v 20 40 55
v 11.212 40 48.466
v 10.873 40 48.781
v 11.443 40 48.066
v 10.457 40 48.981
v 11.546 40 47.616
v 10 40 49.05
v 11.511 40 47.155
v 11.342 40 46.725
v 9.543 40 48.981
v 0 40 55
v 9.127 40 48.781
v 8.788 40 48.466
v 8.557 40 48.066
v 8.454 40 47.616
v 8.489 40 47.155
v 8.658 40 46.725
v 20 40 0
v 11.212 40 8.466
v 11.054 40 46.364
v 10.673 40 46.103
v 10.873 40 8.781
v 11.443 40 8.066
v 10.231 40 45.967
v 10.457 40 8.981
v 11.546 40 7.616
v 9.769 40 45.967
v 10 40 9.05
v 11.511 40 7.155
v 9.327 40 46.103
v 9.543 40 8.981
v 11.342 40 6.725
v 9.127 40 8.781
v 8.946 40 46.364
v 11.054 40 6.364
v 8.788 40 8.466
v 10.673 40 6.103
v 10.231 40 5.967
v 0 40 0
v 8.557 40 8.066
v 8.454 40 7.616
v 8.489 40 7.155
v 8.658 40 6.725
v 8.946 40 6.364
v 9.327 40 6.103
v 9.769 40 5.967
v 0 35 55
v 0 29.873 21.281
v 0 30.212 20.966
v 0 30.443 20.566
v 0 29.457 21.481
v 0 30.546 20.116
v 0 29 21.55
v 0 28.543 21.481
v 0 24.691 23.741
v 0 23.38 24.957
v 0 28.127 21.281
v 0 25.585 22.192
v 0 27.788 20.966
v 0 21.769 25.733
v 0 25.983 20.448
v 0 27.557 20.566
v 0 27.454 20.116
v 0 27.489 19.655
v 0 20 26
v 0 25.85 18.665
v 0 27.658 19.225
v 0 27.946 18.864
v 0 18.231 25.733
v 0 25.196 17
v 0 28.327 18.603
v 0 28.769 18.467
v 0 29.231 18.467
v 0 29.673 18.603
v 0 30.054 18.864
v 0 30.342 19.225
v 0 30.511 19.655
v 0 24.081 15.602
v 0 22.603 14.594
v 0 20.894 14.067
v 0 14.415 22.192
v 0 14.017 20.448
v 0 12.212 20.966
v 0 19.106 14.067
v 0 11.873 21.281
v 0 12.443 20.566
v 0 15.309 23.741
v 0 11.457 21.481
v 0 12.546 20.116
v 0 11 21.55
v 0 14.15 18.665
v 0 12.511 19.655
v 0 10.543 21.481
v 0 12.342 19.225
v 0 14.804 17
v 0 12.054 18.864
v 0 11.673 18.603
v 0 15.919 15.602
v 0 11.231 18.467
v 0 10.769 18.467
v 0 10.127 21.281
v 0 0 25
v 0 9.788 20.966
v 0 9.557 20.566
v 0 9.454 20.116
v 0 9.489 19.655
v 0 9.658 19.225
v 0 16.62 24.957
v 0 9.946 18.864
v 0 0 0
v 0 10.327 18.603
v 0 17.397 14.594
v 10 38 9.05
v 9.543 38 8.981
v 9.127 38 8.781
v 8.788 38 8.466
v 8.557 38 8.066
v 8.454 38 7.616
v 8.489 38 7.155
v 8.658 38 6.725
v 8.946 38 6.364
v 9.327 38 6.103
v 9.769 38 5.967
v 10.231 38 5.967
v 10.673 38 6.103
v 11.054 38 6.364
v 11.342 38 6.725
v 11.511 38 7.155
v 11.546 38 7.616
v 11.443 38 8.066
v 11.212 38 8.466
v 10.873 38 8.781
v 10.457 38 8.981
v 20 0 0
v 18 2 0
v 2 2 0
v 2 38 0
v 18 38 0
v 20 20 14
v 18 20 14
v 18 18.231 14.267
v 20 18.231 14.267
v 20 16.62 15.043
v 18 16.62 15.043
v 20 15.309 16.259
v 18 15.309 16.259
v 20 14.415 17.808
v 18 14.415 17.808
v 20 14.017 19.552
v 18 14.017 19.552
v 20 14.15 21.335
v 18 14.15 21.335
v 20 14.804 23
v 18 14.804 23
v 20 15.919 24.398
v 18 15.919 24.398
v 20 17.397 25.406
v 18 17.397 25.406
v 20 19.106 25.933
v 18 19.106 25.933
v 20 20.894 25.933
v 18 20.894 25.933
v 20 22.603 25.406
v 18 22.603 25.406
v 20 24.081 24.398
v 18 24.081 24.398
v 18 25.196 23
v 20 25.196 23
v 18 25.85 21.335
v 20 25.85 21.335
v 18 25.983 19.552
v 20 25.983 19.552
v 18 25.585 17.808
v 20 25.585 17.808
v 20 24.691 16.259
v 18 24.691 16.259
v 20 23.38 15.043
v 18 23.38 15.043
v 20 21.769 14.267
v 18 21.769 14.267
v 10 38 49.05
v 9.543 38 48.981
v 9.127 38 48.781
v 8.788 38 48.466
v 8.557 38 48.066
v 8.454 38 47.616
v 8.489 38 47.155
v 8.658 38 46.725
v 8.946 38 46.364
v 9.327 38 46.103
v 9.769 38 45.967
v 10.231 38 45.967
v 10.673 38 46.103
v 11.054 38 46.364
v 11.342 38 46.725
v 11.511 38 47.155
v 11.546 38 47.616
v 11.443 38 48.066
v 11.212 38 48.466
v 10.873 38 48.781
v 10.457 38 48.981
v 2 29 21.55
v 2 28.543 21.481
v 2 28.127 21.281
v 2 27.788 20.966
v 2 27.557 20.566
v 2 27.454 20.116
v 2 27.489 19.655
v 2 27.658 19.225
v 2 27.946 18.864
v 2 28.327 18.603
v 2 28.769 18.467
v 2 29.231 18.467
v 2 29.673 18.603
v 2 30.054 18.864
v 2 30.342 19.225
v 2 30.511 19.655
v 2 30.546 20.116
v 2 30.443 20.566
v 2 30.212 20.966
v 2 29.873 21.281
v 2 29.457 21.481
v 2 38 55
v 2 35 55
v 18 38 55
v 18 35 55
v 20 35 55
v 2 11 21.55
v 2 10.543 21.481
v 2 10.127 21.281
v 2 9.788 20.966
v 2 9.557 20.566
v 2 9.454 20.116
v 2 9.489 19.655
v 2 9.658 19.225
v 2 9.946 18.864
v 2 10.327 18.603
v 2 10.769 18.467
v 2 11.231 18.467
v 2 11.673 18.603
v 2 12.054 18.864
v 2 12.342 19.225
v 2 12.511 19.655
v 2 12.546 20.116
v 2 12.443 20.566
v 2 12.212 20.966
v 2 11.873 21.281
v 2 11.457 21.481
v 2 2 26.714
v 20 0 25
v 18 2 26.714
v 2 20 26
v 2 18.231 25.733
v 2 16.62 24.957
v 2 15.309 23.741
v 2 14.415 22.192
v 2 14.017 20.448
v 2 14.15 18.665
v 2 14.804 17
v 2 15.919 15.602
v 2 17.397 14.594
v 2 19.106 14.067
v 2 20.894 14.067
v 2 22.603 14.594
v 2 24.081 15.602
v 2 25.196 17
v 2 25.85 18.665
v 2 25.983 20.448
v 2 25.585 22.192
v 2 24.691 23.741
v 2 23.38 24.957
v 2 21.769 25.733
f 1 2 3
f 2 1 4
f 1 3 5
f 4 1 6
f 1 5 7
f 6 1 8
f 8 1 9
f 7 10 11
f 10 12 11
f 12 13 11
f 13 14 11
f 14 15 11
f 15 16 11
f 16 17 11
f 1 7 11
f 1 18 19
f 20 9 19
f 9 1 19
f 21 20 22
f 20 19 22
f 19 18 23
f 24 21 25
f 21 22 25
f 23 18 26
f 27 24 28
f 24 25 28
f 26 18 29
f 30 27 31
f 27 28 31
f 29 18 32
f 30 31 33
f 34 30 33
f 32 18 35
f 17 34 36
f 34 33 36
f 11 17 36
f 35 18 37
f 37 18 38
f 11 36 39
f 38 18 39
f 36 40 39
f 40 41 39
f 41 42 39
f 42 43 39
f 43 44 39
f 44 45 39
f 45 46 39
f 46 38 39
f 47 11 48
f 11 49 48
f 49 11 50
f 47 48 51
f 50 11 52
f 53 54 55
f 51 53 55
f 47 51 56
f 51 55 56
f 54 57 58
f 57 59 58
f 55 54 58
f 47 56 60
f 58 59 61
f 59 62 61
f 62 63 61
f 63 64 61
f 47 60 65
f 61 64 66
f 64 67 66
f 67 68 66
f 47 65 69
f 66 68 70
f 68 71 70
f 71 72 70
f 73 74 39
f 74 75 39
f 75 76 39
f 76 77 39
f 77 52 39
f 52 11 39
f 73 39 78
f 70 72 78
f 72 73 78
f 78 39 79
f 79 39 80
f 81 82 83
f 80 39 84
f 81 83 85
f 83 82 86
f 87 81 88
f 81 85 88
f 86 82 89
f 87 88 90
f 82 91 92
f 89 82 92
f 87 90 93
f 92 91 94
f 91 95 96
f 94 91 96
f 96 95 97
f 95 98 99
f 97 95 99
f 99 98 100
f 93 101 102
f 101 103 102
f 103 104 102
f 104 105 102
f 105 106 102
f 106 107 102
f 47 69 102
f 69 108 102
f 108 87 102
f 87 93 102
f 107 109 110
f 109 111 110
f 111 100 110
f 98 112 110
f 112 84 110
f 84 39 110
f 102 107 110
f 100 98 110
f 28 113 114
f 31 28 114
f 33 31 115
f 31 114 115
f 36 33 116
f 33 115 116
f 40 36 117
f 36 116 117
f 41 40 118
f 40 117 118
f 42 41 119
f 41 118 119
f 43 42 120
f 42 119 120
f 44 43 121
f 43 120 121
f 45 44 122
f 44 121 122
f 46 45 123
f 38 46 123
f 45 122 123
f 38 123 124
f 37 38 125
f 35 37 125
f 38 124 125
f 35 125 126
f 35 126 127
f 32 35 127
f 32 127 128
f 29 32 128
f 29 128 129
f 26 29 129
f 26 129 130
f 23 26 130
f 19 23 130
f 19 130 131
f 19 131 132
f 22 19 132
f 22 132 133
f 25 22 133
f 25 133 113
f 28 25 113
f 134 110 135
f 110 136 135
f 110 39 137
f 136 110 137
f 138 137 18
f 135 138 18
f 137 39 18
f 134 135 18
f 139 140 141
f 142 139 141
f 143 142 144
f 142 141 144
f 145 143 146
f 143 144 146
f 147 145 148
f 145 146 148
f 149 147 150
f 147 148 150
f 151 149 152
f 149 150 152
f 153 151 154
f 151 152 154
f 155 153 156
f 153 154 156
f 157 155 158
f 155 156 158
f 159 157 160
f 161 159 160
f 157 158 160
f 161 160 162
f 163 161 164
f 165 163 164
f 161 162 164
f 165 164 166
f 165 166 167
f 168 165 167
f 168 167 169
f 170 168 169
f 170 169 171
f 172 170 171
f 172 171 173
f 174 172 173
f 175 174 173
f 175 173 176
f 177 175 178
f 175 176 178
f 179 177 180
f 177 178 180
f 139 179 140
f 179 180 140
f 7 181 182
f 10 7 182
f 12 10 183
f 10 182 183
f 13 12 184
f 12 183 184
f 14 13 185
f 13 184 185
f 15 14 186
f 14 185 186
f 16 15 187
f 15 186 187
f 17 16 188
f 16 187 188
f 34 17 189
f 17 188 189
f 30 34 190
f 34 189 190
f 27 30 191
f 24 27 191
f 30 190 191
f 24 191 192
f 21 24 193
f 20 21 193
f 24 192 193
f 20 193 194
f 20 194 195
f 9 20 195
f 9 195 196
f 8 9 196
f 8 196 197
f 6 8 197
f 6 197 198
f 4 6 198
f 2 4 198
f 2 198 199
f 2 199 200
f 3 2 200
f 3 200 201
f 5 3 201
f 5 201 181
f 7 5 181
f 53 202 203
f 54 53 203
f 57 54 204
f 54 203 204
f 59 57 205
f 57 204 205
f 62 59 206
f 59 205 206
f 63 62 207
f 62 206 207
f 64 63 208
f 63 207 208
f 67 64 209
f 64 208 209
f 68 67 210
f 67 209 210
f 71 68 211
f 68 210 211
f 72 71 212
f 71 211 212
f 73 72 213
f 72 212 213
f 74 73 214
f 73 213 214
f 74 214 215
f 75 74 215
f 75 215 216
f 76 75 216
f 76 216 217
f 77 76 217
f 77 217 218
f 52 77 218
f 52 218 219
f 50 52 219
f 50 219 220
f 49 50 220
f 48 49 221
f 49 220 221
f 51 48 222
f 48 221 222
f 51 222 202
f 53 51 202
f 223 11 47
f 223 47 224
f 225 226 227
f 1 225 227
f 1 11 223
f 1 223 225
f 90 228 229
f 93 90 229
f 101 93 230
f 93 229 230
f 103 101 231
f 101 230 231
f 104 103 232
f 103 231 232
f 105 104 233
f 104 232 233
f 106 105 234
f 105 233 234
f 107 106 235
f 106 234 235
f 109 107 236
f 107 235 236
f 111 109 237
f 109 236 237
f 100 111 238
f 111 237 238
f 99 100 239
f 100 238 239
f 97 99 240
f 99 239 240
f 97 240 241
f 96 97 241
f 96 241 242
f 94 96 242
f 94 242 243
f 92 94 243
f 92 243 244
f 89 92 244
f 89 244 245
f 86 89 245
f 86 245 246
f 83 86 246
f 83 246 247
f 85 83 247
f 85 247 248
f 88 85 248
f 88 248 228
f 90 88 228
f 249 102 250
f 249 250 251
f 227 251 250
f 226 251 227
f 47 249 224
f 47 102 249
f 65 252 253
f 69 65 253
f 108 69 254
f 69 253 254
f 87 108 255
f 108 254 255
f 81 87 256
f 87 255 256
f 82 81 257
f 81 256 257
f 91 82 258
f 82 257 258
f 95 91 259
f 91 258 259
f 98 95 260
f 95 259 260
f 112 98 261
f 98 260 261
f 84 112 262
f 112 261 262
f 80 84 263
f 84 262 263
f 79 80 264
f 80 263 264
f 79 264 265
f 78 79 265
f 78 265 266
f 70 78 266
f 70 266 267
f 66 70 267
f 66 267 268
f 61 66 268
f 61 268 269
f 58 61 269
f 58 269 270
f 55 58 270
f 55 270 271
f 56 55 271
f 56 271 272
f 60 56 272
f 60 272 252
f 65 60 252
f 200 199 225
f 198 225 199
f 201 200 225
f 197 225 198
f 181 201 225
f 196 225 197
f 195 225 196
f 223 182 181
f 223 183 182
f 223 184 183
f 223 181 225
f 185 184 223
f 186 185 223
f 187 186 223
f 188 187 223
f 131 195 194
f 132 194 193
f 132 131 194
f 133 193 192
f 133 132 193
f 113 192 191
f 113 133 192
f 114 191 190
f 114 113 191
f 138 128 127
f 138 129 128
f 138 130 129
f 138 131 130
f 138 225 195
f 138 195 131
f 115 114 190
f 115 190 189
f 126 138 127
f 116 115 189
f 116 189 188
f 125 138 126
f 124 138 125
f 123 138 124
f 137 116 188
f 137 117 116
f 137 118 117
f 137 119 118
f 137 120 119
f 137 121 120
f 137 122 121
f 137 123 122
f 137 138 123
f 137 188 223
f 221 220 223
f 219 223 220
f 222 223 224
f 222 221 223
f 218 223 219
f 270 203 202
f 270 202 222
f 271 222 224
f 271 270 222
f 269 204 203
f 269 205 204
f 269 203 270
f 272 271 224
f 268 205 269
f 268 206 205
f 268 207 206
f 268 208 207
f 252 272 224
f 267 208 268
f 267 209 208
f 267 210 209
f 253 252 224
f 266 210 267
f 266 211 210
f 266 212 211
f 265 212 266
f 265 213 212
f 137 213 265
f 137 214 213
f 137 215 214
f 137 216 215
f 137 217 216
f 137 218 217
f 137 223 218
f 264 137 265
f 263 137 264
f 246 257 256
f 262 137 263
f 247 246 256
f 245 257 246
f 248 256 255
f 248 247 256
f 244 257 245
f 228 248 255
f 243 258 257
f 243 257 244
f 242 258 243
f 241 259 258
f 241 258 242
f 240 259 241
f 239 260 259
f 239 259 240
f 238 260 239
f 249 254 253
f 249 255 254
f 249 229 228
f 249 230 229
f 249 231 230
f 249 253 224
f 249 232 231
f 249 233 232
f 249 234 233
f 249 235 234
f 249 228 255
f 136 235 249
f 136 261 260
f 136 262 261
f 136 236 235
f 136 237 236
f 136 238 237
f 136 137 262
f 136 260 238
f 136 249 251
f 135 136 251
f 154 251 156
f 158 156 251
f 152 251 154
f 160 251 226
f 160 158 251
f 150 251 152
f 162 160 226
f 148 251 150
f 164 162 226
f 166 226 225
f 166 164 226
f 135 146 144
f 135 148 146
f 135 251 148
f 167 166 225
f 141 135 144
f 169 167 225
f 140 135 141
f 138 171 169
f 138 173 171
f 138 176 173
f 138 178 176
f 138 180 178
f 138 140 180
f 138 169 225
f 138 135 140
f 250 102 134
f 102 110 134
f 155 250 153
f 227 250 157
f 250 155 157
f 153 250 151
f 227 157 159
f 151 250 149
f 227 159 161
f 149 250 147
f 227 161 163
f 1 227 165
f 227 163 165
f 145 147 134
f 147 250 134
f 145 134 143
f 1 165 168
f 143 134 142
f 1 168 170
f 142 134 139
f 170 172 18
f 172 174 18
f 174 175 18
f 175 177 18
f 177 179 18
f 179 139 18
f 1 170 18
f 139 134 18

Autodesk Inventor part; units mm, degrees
ref_plane "YZ Plane" through (0, 0, 0) normal (1, 0, 0) x (0, 1, 0)
ref_plane "XZ Plane" through (0, 0, 0) normal (0, 1, 0) x (-1, 0, 0)
ref_plane "XY Plane" through (0, 0, 0) normal (0, 0, 1) x (1, 0, 0)
sketch "スケッチ1" plane through (0, 0, 0) normal (0, 0, 1) x (1, 0, 0)
  line L0 (0, 0) -> (20, 0)
  line L1 (20, 0) -> (20, 40)
  line L2 (20, 40) -> (0, 40)
  line L3 (0, 40) -> (0, 0)
  line L4 (2, 2) -> (18, 2)
  line L5 (18, 2) -> (18, 38)
  line L6 (18, 38) -> (2, 38)
  line L7 (2, 38) -> (2, 2)
  dimension "d0" = 20
  dimension "d1" = 40
  dimension "d2" = 2
extrude "押し出し1" add sketch "スケッチ1" along normal blind 55
sketch "スケッチ2" plane through (20, 0, 0) normal (1, 0, 0) x (0, 0, -1)
  line L0 (0, 0) -> (0, 40) projected
  point P0 (-20, 20)
  dimension "d5" = 20
hole "穴1" at (20, 20, 20) direction (-1, 0, 0) diameter 12 depth 2
sketch "スケッチ3" plane through (0, 0, 0) normal (-1, 0, 0) x (0, 0, 1)
  line L0 (0, 40) -> (0, 0) projected
  line L1 (0, 40) -> (55, 40) projected
  point P0 (20, 20)
  point P1 (20, 11)
  point P2 (20, 29)
  dimension "d13" = 20
  dimension "d14" = 20
  dimension "d15" = 9
  dimension "d16" = 9
hole "穴2" at (0, 20, 20) direction (1, 0, 0) diameter 12 depth 2
hole "穴3" at (0, 11, 20) at (0, 29, 20) direction (1, 0, 0) diameter 3.1 depth 2
sketch "スケッチ4" plane through (0, 40, 0) normal (0, 1, 0) x (1, 0, 0)
  line L0 (20, 0) -> (0, 0) projected
  point P0 (10, -7.5)
  point P1 (10, -47.5)
  dimension "d31" = 7.5
  dimension "d32" = 47.5
hole "穴4" at (10, 40, 7.5) at (10, 40, 47.5) direction (0, -1, 0) diameter 3.1 depth 2
sketch "スケッチ5" plane through (0, 0, 0) normal (-1, 0, 0) x (0, 0, 1)
  line L0 (0, 0) -> (55, 0) projected
  line L1 (25, 0) -> (55, 35)
  line L2 (55, 2) -> (55, 38) projected
  line L3 (55, 40) -> (55, 0) projected
  dimension "d40" = 30
  dimension "d41" = 35
extrude "押し出し2" cut sketch "スケッチ5" against normal blind 55
equation "\"d16\" = d15"
properties part number "SU22_SQP_20_40_EU_sn" material "アルミニウム 6061-AHC"
